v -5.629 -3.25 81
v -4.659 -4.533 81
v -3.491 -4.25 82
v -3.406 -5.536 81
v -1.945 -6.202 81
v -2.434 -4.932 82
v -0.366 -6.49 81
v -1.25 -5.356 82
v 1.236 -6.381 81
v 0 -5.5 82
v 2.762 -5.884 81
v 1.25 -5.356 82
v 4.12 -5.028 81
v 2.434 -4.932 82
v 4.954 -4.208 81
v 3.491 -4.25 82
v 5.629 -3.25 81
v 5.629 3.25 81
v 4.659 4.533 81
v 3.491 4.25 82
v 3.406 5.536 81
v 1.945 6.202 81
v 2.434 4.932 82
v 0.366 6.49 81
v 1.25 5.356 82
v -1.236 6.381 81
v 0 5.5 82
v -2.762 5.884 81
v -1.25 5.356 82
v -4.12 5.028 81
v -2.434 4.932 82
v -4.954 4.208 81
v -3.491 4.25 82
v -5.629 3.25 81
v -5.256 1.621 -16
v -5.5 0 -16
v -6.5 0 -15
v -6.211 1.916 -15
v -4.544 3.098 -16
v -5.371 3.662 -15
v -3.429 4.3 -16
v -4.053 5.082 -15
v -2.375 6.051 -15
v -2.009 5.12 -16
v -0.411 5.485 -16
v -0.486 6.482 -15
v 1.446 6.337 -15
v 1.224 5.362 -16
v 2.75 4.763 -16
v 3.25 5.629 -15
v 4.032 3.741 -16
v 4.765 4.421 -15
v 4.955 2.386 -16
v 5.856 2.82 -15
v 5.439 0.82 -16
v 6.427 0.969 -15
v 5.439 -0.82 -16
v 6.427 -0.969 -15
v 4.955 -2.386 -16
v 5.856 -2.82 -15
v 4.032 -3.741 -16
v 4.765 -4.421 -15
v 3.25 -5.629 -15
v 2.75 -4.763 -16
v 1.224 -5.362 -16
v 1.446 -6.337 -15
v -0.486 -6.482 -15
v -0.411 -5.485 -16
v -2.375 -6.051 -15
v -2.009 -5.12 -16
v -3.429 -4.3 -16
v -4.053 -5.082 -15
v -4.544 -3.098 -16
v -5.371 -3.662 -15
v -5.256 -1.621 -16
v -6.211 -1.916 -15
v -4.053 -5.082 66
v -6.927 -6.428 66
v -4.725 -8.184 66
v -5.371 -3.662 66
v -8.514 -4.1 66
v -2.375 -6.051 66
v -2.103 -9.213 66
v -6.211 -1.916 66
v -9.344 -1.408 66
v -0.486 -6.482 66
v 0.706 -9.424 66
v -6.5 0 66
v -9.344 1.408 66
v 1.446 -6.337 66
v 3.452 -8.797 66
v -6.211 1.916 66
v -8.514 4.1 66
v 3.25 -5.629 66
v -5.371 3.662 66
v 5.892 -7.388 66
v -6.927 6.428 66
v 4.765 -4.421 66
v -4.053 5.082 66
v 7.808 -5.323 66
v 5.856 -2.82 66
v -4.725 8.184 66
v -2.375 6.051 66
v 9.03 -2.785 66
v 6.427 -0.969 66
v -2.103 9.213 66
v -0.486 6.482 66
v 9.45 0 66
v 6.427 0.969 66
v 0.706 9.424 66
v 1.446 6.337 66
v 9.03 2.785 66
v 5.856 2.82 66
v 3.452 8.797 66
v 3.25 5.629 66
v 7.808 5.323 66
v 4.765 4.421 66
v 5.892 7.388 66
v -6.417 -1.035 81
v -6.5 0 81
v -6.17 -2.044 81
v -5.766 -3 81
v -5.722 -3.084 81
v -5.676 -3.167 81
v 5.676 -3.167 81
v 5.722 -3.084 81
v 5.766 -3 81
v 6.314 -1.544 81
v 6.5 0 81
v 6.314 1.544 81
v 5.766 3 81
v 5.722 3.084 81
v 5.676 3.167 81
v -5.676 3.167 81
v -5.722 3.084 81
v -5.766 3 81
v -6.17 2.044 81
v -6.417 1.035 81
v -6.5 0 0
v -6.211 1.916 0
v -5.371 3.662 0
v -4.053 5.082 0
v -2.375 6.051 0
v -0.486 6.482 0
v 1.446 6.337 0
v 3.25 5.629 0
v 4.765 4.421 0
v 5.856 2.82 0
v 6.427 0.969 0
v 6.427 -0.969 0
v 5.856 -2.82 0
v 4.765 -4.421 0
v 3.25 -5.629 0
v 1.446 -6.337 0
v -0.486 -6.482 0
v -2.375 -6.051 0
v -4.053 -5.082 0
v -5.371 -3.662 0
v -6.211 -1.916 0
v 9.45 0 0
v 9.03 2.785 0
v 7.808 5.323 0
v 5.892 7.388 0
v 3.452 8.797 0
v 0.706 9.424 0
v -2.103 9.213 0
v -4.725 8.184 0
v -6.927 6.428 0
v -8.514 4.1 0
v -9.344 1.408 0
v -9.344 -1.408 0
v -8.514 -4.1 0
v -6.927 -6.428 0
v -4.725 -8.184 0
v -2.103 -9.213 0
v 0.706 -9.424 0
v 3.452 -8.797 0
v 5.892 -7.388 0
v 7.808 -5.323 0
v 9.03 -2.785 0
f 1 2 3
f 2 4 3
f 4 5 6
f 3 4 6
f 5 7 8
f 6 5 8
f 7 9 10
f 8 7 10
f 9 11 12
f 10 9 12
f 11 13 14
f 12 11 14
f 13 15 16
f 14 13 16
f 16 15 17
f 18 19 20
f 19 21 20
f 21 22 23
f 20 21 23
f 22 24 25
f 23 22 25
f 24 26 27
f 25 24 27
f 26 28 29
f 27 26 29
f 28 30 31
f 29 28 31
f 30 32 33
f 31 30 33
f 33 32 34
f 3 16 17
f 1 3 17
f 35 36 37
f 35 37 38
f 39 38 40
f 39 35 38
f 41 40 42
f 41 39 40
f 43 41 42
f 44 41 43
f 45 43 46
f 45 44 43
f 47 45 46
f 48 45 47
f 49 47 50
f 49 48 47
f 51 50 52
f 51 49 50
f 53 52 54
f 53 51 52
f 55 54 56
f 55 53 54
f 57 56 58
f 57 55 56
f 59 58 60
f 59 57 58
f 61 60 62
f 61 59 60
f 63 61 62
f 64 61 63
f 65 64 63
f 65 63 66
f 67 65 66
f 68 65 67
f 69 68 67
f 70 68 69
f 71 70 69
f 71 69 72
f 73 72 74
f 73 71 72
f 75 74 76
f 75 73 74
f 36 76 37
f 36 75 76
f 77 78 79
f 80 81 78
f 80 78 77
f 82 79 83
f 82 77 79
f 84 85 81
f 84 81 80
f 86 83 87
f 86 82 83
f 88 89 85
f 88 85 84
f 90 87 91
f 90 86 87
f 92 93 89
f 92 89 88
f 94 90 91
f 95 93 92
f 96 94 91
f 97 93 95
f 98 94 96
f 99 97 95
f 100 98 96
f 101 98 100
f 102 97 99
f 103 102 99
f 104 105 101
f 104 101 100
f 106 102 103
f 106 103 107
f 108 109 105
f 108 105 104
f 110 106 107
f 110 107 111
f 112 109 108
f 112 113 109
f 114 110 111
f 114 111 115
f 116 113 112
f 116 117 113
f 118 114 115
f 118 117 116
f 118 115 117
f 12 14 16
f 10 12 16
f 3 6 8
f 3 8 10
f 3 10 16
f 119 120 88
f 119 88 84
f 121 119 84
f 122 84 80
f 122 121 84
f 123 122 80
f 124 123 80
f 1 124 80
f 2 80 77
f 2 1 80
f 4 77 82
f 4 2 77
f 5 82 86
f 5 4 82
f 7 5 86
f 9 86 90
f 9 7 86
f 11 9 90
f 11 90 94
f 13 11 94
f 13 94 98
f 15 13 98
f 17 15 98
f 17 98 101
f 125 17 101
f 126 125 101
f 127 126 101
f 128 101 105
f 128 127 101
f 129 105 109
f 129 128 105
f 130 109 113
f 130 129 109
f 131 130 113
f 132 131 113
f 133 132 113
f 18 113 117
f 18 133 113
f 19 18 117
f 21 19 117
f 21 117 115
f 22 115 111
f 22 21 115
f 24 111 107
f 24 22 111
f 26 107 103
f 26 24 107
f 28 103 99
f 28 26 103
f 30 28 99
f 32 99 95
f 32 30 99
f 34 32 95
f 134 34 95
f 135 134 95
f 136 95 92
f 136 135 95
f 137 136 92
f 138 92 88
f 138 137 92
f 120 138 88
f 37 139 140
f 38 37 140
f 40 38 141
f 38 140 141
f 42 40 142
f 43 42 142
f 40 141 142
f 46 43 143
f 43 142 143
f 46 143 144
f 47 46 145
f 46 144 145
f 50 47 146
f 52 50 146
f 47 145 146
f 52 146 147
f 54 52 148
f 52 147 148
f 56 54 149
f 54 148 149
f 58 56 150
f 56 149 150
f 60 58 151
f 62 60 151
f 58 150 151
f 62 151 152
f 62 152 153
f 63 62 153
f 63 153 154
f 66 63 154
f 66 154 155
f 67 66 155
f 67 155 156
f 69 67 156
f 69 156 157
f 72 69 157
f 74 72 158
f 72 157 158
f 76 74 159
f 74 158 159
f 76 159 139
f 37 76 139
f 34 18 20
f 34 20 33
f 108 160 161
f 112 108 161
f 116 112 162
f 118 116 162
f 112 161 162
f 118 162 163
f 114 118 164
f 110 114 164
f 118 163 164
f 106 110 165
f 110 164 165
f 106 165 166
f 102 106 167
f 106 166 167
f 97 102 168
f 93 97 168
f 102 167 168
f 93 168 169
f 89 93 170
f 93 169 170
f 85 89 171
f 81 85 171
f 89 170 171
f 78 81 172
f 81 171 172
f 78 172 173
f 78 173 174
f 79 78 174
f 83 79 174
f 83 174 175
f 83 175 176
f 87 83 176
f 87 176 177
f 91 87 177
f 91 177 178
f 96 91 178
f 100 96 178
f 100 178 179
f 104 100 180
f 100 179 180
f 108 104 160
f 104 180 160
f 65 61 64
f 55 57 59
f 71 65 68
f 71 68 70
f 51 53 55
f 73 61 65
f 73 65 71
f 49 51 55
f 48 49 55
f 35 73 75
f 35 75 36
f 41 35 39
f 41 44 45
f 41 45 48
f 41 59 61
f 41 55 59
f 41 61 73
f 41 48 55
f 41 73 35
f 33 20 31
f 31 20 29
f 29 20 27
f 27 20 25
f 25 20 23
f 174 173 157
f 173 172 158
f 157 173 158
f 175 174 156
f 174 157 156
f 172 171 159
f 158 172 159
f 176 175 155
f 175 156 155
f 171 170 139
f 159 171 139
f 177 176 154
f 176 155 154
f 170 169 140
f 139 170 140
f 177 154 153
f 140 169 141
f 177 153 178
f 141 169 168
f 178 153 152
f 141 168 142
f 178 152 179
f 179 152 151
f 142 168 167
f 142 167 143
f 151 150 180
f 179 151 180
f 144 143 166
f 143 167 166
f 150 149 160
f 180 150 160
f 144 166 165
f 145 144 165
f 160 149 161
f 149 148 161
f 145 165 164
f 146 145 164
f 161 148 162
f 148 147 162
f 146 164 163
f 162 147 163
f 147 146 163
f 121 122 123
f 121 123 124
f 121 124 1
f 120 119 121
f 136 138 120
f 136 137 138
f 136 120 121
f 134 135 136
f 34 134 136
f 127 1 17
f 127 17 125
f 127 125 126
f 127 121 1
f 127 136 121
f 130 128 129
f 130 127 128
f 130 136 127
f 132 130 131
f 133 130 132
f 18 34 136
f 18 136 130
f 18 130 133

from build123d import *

# Parameters (mm, degrees)
CROQUIS1_R              = 9.45
SALIENTE_EXTRUIR1_DEPTH = 66
CROQUIS7_R              = 6.5
SALIENTE_EXTRUIR5_DEPTH = 16
CHAFL_N5_SIZE           = 1
SALIENTE_EXTRUIR6_START = 16
CROQUIS12_R             = 6.5
SALIENTE_EXTRUIR6_DEPTH = 16
CORTAR_EXTRUIR12_DEPTH  = 1
CHAFL_N7_SIZE           = 1.25
CHAFL_N8_SIZE           = 1.25
CHAFL_N9_SIZE           = 1
CHAFL_N10_SIZE          = 1


with BuildPart() as part:
    # Croquis1 → Saliente-Extruir1 (new body)
    with BuildSketch(Plane.XY):
        Circle(CROQUIS1_R)
    extrude(amount=SALIENTE_EXTRUIR1_DEPTH)

    # Croquis7 → Saliente-Extruir5 (add)
    with BuildSketch(Plane(origin=(0, 0, 0), x_dir=(-1, 0, 0), z_dir=(0, 0, -1))):
        Circle(CROQUIS7_R)
    extrude(amount=SALIENTE_EXTRUIR5_DEPTH)

    # Chaflán5
    chafl_n5_edges = [part.edges().sort_by_distance(p)[0] for p in [
        (6.5, 0, -16),
    ]]
    chamfer(chafl_n5_edges, length=CHAFL_N5_SIZE)

    # Croquis12 → Saliente-Extruir6 (add)
    with BuildSketch(Plane.XY.offset(66).offset(SALIENTE_EXTRUIR6_START)):
        with Locations(Location((0, 0, 0), (0, 0, 180))):
            Circle(CROQUIS12_R)
    extrude(amount=-SALIENTE_EXTRUIR6_DEPTH)

    # Croquis13 → Cortar-Extruir12 (cut)
    with BuildSketch(Plane.XY.offset(82)):
        with BuildLine():
            Line((5.766281297, -3), (-5.766281297, -3))
            ThreePointArc((-5.766281297, -3), (-6.5, 0), (-5.766281297, 3))
            Line((-5.766281297, 3), (5.766281297, 3))
            ThreePointArc((5.766281297, 3), (6.5, 0), (5.766281297, -3))
        make_face()
    extrude(amount=-CORTAR_EXTRUIR12_DEPTH, mode=Mode.SUBTRACT)

    # Chaflán7
    # the kernel refuses this chamfer: 1.25 mm, written as the material it takes off along each edge
    with BuildSketch(Plane(origin=(-8.980885032, 3, 82), x_dir=(0, -0.02749587661058643, -0.9996219169112968), z_dir=(1, 0, 0))) as chafl_n7_piece_1_section:
        Polygon((CHAFL_N7_SIZE * 0.999621916911, CHAFL_N7_SIZE * 0.0274958766106), (-CHAFL_N7_SIZE * 0.0274958766106, CHAFL_N7_SIZE * 0.999621916911), (0, 0), align=None)
    chafl_n7_piece_1 = extrude(amount=17.961770065, mode=Mode.PRIVATE)
    chafl_n7_piece_1 = split(chafl_n7_piece_1, bisect_by=Plane(origin=(0, 3.432148015, 81), z_dir=(0, 0, 1)), keep=Keep.TOP, mode=Mode.PRIVATE)
    add(chafl_n7_piece_1, mode=Mode.SUBTRACT)

    # Chaflán8
    # the kernel refuses this chamfer: 1.25 mm, written as the material it takes off along each edge
    with BuildSketch(Plane(origin=(8.980885032, -3, 82), x_dir=(0, -0.9996219169112969, 0.027495876610582178), z_dir=(-1, 0, 0))) as chafl_n8_piece_1_section:
        Polygon((CHAFL_N8_SIZE * 0.999621916911, -CHAFL_N8_SIZE * 0.0274958766106), (-CHAFL_N8_SIZE * 0.0274958766106, -CHAFL_N8_SIZE * 0.999621916911), (0, 0), align=None)
    chafl_n8_piece_1 = extrude(amount=17.961770065, mode=Mode.PRIVATE)
    chafl_n8_piece_1 = split(chafl_n8_piece_1, bisect_by=Plane(origin=(0, -3.432148015, 81), z_dir=(0, 0, 1)), keep=Keep.TOP, mode=Mode.PRIVATE)
    add(chafl_n8_piece_1, mode=Mode.SUBTRACT)

    # Chaflán9
    chafl_n9_edges = [part.edges().sort_by_distance(p)[0] for p in [
        (0, 6.5, 82),
    ]]
    chamfer(chafl_n9_edges, length=CHAFL_N9_SIZE)

    # Chaflán10
    chafl_n10_edges = [part.edges().sort_by_distance(p)[0] for p in [
        (0, -6.5, 82),
    ]]
    chamfer(chafl_n10_edges, length=CHAFL_N10_SIZE)


solid = part.part
